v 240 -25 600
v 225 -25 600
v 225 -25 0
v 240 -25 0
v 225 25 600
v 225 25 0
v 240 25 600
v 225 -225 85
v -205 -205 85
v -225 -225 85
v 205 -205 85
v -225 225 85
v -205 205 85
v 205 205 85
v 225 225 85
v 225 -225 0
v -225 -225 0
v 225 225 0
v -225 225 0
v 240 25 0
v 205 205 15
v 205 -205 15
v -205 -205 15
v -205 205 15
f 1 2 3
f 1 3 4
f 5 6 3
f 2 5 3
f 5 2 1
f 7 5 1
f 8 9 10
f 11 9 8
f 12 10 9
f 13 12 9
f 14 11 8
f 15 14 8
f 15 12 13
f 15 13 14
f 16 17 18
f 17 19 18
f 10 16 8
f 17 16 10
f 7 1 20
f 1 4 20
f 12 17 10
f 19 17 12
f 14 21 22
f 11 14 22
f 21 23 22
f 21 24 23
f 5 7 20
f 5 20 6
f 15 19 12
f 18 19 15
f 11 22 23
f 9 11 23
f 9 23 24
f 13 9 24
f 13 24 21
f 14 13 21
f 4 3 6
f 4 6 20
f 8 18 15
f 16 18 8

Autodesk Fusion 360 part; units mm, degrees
sketch "草图1" plane through (0, 0, 0) normal (0, 0, 1) x (1, 0, 0) in component "base"
  line L0 (200, -200) -> (-200, -200) construction
  line L1 (-200, -200) -> (-200, 200) construction
  line L2 (-200, 200) -> (200, 200) construction
  line L3 (200, 200) -> (200, -200) construction
  line L4 (200, -200) -> (-200, 200) construction
  line L5 (-200, -200) -> (200, 200) construction
  line L6 (205, -205) -> (-205, -205)
  line L7 (-205, -205) -> (-205, 205)
  line L8 (-205, 205) -> (205, 205)
  line L9 (205, 205) -> (205, -205)
  line L10 (225, -225) -> (-225, -225)
  line L11 (-225, -225) -> (-225, 225)
  line L12 (-225, 225) -> (225, 225)
  line L13 (225, 225) -> (225, -225)
  line L14 (225, -25) -> (240, -25)
  line L15 (240, -25) -> (240, 25)
  line L16 (240, 25) -> (225, 25)
  line L17 (225, 25) -> (225, -25)
  line L18 (1.75, 0) -> (22.5, 0)
  dimension "d1" = 400
  dimension "d2" = 400
  dimension "d3" = -5
  dimension "d4" = -25
  dimension "d9" = 15
  dimension "d10" = 50
extrude "拉伸1" add sketch "草图1" along normal blind 85 contours L10 L11 L12 L13 L17 makes body 1 in component "base"
extrude "拉伸2" add sketch "草图1" along normal blind 15 contours L6 L7 L8 L9 bodies 1 in component "base"
extrude "拉伸3" add sketch "草图1" along normal blind 600 separate body contours L13 L14 L15 L16 L17 makes body 2 in component "base"
component "base" placed x (1, 0, 0) y (0, 1, 0) z (0, 0, 1) at (0, 0, 0)
